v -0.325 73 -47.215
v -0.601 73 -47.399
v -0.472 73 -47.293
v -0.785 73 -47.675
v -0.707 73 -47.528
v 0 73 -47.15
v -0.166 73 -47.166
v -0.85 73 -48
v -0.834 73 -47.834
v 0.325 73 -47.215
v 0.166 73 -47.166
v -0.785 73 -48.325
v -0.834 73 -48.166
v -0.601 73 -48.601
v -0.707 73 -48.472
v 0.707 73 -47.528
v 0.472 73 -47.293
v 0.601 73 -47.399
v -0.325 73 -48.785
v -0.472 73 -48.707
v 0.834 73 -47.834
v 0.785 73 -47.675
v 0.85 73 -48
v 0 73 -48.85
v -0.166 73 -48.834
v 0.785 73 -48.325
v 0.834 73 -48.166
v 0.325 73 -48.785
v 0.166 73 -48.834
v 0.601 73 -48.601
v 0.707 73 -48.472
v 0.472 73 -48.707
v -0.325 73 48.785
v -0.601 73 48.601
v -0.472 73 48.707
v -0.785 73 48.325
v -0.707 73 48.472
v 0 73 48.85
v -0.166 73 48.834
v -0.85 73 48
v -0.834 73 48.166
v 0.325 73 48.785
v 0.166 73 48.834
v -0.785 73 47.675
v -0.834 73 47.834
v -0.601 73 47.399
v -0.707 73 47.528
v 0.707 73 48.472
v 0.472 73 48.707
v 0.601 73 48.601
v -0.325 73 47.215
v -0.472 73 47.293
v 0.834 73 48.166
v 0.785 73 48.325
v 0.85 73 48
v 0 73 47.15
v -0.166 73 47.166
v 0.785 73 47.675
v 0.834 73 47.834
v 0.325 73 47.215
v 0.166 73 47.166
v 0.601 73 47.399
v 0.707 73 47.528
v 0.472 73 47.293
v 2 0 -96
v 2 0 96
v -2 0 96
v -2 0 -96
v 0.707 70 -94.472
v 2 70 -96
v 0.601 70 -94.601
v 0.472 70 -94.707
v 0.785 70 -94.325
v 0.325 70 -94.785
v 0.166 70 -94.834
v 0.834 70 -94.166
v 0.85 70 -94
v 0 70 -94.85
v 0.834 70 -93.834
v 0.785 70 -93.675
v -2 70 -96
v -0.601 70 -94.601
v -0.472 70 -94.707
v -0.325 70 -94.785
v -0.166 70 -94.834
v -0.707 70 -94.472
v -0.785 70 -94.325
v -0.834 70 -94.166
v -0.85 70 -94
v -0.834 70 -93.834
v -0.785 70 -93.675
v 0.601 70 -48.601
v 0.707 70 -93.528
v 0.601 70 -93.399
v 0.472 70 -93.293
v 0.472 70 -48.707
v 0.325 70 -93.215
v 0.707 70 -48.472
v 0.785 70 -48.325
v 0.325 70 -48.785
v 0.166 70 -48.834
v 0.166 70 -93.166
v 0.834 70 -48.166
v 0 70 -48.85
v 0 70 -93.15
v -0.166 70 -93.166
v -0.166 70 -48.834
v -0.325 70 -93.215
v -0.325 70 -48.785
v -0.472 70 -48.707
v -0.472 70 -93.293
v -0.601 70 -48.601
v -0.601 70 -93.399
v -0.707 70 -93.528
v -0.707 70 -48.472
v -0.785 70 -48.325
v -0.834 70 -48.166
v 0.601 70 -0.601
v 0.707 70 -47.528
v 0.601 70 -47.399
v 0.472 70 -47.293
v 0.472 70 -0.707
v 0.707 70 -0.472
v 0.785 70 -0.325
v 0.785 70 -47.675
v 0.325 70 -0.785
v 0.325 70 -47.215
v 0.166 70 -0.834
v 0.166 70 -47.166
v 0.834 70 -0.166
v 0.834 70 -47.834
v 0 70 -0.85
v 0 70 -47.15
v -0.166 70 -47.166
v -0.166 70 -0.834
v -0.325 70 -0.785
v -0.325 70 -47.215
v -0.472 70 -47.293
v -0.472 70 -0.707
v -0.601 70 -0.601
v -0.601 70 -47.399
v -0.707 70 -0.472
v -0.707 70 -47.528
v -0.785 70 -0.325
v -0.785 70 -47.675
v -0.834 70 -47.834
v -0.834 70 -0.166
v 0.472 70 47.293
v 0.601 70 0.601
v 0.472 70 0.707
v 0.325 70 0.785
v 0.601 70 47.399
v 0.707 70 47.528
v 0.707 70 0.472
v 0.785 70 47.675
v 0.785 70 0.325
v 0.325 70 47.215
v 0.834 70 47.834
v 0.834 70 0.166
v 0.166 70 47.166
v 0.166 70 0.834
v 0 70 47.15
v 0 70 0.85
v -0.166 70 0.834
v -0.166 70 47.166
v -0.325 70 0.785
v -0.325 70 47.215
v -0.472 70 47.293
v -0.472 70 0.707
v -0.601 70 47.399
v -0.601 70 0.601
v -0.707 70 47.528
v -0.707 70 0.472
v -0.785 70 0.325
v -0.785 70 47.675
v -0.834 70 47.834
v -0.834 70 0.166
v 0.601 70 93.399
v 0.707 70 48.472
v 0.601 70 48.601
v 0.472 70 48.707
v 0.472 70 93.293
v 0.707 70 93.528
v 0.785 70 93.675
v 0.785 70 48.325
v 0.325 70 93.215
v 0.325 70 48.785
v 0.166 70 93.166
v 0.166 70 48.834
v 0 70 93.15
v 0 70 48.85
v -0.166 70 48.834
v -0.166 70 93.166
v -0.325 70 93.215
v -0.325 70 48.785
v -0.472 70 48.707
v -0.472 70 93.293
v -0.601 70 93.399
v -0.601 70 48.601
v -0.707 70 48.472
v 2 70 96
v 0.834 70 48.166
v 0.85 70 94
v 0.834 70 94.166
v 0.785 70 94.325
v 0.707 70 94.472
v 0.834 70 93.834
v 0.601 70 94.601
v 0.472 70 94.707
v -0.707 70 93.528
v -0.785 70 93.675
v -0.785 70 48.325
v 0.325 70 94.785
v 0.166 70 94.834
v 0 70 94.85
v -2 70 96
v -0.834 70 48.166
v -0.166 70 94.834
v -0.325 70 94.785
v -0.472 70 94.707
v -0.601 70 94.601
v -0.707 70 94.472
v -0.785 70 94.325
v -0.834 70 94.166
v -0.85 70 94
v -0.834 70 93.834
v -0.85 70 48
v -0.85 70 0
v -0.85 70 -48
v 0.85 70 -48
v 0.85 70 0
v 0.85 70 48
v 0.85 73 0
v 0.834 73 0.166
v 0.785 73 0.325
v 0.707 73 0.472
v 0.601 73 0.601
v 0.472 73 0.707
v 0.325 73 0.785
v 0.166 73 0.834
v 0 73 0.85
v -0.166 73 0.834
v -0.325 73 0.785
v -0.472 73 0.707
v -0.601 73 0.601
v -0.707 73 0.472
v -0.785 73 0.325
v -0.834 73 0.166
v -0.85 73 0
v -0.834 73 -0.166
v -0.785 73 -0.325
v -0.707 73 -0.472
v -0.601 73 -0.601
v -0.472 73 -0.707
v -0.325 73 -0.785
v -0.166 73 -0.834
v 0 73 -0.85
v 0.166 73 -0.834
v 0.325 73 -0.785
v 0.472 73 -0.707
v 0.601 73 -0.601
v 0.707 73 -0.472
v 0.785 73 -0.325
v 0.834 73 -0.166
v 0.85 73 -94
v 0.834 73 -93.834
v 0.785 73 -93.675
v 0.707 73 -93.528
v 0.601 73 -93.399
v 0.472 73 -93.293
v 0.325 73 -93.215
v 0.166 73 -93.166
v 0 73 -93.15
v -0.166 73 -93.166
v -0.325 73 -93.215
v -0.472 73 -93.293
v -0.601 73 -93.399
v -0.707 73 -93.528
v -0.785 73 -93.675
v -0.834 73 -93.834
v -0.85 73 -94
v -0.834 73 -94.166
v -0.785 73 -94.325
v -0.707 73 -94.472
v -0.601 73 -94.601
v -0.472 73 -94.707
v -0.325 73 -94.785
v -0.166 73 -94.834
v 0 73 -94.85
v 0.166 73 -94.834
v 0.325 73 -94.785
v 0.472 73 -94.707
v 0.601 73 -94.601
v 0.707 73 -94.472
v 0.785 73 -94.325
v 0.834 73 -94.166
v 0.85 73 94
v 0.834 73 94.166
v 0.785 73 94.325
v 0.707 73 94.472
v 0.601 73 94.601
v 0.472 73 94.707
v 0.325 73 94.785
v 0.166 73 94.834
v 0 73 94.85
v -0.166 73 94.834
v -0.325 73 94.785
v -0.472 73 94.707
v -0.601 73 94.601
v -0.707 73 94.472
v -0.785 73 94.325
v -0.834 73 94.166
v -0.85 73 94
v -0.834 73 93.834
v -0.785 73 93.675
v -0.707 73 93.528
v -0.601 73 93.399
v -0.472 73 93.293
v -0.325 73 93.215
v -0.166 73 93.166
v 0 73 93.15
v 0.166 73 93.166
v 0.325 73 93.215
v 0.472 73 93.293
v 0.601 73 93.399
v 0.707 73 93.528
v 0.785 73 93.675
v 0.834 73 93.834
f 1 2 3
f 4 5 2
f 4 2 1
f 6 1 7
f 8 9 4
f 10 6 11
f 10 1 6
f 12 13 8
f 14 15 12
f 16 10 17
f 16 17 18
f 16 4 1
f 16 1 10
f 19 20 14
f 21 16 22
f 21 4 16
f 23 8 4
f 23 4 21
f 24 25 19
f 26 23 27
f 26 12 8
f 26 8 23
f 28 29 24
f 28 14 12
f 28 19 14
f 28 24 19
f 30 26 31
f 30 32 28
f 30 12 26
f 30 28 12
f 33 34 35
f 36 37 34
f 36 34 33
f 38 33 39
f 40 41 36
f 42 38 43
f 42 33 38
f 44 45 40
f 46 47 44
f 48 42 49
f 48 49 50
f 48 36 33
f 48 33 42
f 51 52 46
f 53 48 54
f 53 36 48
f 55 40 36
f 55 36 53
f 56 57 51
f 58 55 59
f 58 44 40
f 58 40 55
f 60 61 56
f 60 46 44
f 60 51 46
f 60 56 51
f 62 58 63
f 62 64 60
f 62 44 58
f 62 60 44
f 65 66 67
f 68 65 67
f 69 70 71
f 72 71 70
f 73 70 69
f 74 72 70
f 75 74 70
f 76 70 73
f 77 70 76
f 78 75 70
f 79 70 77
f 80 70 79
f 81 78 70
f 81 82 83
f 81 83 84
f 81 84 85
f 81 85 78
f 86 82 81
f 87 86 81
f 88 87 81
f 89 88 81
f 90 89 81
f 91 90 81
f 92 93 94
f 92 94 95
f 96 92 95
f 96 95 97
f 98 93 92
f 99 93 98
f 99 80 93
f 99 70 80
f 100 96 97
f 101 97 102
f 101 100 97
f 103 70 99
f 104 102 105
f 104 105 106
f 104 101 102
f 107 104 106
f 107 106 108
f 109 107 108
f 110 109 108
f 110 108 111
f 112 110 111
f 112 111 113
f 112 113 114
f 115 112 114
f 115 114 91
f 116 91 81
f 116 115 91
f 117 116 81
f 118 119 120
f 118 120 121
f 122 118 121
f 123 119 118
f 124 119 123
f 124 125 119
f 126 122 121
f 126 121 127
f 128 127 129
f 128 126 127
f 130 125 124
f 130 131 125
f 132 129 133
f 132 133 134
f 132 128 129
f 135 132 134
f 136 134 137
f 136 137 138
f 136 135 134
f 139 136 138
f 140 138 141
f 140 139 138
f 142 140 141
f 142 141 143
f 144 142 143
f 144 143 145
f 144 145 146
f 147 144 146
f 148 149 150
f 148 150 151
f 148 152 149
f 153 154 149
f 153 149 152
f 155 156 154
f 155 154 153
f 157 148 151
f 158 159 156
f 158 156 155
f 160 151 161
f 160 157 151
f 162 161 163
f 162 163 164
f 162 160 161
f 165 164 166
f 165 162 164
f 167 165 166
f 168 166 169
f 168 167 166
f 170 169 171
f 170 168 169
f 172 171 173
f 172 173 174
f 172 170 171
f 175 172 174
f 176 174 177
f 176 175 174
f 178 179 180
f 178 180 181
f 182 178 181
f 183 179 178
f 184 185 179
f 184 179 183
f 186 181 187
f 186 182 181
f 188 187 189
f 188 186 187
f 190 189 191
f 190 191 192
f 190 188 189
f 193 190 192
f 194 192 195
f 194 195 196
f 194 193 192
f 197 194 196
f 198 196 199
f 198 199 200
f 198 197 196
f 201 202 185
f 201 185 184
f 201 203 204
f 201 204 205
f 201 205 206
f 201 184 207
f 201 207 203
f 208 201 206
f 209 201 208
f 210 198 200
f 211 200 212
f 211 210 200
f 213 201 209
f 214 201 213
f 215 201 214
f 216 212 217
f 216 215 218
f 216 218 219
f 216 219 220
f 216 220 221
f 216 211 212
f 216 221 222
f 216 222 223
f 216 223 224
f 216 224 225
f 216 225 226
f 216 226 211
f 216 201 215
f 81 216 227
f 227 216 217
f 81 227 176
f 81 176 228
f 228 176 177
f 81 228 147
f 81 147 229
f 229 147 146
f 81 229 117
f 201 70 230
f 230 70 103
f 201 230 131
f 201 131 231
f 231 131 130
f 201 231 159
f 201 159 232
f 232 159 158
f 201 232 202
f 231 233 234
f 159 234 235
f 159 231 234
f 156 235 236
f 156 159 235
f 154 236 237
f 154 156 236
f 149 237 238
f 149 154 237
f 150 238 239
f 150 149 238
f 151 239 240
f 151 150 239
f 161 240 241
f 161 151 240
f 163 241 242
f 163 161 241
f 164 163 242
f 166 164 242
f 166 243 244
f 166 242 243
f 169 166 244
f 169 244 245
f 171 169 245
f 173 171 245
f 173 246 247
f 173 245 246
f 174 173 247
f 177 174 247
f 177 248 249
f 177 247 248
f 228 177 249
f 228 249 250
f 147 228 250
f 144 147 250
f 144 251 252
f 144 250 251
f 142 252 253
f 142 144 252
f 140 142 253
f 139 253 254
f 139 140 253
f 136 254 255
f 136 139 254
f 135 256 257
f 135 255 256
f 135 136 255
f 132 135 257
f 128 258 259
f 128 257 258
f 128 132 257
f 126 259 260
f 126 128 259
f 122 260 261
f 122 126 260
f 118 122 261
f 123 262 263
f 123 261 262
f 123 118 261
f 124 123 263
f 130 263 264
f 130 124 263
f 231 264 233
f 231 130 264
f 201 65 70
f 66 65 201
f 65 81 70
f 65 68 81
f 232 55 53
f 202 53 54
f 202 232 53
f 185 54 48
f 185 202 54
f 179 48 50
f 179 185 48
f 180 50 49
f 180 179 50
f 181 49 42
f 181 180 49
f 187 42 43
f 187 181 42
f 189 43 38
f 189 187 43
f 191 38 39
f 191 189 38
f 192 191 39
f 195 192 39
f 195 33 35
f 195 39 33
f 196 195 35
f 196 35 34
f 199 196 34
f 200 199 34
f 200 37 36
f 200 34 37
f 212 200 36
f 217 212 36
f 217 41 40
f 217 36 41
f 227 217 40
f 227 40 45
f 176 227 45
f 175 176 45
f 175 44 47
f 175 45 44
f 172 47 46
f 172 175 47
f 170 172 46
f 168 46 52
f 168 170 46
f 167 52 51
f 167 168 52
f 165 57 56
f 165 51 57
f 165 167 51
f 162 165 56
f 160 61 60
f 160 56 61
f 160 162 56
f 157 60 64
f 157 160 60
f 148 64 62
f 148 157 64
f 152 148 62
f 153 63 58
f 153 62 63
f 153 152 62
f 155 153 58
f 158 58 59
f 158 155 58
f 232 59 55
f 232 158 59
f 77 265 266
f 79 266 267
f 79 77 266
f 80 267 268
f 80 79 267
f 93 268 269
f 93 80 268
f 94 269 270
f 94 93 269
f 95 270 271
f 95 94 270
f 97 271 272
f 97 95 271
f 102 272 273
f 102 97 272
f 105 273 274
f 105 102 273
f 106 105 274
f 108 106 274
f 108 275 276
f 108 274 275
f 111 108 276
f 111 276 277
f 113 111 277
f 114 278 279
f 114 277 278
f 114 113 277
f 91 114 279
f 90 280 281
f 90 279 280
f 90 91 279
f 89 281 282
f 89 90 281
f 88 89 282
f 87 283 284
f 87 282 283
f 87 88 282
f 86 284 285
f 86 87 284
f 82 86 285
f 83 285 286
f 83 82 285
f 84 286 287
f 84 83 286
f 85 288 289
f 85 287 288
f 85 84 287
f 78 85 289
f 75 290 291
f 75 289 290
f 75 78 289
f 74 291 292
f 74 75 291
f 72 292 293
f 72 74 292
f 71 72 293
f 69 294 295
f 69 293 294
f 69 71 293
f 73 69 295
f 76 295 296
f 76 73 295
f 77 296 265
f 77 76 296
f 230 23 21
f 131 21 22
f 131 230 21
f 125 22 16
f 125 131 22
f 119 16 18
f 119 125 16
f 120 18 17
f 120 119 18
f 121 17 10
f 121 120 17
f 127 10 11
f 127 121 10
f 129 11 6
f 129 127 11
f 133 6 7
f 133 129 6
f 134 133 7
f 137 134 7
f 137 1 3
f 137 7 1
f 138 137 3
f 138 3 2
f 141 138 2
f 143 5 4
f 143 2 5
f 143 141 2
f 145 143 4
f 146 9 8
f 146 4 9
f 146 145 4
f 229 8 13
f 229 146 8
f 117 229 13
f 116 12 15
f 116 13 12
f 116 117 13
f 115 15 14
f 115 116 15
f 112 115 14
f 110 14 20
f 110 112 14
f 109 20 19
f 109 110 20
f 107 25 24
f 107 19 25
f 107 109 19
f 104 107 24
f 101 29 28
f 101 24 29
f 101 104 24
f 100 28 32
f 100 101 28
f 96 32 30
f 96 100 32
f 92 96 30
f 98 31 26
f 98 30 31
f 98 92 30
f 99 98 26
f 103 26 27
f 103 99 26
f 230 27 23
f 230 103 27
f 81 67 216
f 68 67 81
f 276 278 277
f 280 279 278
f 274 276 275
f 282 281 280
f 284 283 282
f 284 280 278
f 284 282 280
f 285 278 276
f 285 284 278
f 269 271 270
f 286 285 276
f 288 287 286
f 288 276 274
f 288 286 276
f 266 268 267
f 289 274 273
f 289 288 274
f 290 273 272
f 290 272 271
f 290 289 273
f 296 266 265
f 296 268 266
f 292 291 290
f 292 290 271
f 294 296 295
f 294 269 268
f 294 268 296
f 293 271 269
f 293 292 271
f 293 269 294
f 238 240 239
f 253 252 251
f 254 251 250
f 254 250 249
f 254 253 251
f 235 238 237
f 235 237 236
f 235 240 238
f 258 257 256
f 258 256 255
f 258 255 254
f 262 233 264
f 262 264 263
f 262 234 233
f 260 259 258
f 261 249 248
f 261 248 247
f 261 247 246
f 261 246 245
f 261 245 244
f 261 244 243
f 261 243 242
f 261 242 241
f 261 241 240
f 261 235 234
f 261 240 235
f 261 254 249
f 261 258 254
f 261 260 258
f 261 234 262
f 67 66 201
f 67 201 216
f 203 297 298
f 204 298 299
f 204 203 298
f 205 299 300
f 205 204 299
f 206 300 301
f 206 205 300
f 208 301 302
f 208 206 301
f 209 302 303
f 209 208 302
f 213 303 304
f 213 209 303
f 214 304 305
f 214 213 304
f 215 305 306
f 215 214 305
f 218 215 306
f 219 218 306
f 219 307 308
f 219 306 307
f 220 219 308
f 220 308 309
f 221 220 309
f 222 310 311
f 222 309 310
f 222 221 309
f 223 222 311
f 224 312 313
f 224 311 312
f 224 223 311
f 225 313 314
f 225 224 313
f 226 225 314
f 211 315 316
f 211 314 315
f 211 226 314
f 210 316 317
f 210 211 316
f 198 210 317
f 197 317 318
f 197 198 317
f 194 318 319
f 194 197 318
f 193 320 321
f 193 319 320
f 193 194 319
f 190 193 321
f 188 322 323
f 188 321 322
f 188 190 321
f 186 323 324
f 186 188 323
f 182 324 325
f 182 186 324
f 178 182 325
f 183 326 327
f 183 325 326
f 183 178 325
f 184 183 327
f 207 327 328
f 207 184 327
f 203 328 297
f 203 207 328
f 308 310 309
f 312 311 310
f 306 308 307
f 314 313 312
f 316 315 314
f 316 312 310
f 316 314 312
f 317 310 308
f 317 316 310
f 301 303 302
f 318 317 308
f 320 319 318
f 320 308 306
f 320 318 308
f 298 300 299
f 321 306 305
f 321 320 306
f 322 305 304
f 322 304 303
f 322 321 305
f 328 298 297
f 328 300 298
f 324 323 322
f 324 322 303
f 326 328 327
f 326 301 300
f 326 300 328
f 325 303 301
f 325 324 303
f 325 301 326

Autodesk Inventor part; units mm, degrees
ref_plane "YZ Plane" through (0, 0, 0) normal (1, 0, 0) x (0, 1, 0)
ref_plane "XZ Plane" through (0, 0, 0) normal (0, 1, 0) x (-1, 0, 0)
ref_plane "XY Plane" through (0, 0, 0) normal (0, 0, 1) x (1, 0, 0)
sketch "Sketch1" plane through (0, 0, 0) normal (0, 1, 0) x (-1, 0, 0)
  line L0 (2, -96) -> (-2, -96)
  line L1 (-2, -96) -> (-2, 96)
  line L2 (-2, 96) -> (2, 96)
  line L3 (2, 96) -> (2, -96)
  line L4 (2, -96) -> (-2, 96) construction
  line L5 (-2, -96) -> (2, 96) construction
  circle A0 centre (0, 94) radius 0.85
  circle A1 centre (0, -94) radius 0.85
  circle A2 centre (0, 0) radius 0.85
  circle A3 centre (0, 48) radius 0.85
  circle A4 centre (0, -48) radius 0.85
  point P0 (0, 0)
  dimension "d0" = 192
  dimension "d1" = 4
  dimension "d2" = 1.7
  dimension "d3" = 2
  dimension "d4" = 2
  dimension "d5" = 1.7
  dimension "d6" = 2
  dimension "d7" = 2
  dimension "d8" = 1.7
  dimension "d9" = 96
  dimension "d10" = 2
  dimension "d11" = 1.7
  dimension "d12" = 2
  dimension "d13" = 48
  dimension "d14" = 1.7
  dimension "d15" = 2
  dimension "d16" = 48
extrude "MainBody" add sketch "Sketch1" along normal blind 70
sketch "Sketch2" plane through (0, 70, 0) normal (0, 1, 0) x (1, 0, 0)
  circle A0 centre (0, 0) radius 0.85
extrude "MiddlePole" add sketch "Sketch2" along normal blind 3 and the other way blind 70
sketch "Sketch3" plane through (0, 70, 0) normal (0, 1, 0) x (1, 0, 0)
  circle A0 centre (0, -48) radius 0.85
  point P0 (0, 0)
extrude "MiddleLeftPole" add sketch "Sketch3" along normal blind 3 and the other way blind 70
sketch "Sketch4" plane through (0, 70, 0) normal (0, 1, 0) x (1, 0, 0)
  circle A0 centre (0, -94) radius 0.85
  point P0 (0, 0)
extrude "LeftMostPole" add sketch "Sketch4" along normal blind 3 and the other way blind 70
sketch "Sketch5" plane through (0, 70, 0) normal (0, 1, 0) x (1, 0, 0)
  circle A0 centre (0, 48) radius 0.85
  point P0 (0, 0)
extrude "Extrusion5" add sketch "Sketch5" along normal blind 3 and the other way blind 70
sketch "Sketch6" plane through (0, 70, 0) normal (0, 1, 0) x (1, 0, 0)
  circle A0 centre (0, 94) radius 0.85
  point P0 (0, 0)
extrude "Extrusion6" add sketch "Sketch6" along normal blind 3 and the other way blind 70
properties part number "DindingKargoDepanBelakang"
